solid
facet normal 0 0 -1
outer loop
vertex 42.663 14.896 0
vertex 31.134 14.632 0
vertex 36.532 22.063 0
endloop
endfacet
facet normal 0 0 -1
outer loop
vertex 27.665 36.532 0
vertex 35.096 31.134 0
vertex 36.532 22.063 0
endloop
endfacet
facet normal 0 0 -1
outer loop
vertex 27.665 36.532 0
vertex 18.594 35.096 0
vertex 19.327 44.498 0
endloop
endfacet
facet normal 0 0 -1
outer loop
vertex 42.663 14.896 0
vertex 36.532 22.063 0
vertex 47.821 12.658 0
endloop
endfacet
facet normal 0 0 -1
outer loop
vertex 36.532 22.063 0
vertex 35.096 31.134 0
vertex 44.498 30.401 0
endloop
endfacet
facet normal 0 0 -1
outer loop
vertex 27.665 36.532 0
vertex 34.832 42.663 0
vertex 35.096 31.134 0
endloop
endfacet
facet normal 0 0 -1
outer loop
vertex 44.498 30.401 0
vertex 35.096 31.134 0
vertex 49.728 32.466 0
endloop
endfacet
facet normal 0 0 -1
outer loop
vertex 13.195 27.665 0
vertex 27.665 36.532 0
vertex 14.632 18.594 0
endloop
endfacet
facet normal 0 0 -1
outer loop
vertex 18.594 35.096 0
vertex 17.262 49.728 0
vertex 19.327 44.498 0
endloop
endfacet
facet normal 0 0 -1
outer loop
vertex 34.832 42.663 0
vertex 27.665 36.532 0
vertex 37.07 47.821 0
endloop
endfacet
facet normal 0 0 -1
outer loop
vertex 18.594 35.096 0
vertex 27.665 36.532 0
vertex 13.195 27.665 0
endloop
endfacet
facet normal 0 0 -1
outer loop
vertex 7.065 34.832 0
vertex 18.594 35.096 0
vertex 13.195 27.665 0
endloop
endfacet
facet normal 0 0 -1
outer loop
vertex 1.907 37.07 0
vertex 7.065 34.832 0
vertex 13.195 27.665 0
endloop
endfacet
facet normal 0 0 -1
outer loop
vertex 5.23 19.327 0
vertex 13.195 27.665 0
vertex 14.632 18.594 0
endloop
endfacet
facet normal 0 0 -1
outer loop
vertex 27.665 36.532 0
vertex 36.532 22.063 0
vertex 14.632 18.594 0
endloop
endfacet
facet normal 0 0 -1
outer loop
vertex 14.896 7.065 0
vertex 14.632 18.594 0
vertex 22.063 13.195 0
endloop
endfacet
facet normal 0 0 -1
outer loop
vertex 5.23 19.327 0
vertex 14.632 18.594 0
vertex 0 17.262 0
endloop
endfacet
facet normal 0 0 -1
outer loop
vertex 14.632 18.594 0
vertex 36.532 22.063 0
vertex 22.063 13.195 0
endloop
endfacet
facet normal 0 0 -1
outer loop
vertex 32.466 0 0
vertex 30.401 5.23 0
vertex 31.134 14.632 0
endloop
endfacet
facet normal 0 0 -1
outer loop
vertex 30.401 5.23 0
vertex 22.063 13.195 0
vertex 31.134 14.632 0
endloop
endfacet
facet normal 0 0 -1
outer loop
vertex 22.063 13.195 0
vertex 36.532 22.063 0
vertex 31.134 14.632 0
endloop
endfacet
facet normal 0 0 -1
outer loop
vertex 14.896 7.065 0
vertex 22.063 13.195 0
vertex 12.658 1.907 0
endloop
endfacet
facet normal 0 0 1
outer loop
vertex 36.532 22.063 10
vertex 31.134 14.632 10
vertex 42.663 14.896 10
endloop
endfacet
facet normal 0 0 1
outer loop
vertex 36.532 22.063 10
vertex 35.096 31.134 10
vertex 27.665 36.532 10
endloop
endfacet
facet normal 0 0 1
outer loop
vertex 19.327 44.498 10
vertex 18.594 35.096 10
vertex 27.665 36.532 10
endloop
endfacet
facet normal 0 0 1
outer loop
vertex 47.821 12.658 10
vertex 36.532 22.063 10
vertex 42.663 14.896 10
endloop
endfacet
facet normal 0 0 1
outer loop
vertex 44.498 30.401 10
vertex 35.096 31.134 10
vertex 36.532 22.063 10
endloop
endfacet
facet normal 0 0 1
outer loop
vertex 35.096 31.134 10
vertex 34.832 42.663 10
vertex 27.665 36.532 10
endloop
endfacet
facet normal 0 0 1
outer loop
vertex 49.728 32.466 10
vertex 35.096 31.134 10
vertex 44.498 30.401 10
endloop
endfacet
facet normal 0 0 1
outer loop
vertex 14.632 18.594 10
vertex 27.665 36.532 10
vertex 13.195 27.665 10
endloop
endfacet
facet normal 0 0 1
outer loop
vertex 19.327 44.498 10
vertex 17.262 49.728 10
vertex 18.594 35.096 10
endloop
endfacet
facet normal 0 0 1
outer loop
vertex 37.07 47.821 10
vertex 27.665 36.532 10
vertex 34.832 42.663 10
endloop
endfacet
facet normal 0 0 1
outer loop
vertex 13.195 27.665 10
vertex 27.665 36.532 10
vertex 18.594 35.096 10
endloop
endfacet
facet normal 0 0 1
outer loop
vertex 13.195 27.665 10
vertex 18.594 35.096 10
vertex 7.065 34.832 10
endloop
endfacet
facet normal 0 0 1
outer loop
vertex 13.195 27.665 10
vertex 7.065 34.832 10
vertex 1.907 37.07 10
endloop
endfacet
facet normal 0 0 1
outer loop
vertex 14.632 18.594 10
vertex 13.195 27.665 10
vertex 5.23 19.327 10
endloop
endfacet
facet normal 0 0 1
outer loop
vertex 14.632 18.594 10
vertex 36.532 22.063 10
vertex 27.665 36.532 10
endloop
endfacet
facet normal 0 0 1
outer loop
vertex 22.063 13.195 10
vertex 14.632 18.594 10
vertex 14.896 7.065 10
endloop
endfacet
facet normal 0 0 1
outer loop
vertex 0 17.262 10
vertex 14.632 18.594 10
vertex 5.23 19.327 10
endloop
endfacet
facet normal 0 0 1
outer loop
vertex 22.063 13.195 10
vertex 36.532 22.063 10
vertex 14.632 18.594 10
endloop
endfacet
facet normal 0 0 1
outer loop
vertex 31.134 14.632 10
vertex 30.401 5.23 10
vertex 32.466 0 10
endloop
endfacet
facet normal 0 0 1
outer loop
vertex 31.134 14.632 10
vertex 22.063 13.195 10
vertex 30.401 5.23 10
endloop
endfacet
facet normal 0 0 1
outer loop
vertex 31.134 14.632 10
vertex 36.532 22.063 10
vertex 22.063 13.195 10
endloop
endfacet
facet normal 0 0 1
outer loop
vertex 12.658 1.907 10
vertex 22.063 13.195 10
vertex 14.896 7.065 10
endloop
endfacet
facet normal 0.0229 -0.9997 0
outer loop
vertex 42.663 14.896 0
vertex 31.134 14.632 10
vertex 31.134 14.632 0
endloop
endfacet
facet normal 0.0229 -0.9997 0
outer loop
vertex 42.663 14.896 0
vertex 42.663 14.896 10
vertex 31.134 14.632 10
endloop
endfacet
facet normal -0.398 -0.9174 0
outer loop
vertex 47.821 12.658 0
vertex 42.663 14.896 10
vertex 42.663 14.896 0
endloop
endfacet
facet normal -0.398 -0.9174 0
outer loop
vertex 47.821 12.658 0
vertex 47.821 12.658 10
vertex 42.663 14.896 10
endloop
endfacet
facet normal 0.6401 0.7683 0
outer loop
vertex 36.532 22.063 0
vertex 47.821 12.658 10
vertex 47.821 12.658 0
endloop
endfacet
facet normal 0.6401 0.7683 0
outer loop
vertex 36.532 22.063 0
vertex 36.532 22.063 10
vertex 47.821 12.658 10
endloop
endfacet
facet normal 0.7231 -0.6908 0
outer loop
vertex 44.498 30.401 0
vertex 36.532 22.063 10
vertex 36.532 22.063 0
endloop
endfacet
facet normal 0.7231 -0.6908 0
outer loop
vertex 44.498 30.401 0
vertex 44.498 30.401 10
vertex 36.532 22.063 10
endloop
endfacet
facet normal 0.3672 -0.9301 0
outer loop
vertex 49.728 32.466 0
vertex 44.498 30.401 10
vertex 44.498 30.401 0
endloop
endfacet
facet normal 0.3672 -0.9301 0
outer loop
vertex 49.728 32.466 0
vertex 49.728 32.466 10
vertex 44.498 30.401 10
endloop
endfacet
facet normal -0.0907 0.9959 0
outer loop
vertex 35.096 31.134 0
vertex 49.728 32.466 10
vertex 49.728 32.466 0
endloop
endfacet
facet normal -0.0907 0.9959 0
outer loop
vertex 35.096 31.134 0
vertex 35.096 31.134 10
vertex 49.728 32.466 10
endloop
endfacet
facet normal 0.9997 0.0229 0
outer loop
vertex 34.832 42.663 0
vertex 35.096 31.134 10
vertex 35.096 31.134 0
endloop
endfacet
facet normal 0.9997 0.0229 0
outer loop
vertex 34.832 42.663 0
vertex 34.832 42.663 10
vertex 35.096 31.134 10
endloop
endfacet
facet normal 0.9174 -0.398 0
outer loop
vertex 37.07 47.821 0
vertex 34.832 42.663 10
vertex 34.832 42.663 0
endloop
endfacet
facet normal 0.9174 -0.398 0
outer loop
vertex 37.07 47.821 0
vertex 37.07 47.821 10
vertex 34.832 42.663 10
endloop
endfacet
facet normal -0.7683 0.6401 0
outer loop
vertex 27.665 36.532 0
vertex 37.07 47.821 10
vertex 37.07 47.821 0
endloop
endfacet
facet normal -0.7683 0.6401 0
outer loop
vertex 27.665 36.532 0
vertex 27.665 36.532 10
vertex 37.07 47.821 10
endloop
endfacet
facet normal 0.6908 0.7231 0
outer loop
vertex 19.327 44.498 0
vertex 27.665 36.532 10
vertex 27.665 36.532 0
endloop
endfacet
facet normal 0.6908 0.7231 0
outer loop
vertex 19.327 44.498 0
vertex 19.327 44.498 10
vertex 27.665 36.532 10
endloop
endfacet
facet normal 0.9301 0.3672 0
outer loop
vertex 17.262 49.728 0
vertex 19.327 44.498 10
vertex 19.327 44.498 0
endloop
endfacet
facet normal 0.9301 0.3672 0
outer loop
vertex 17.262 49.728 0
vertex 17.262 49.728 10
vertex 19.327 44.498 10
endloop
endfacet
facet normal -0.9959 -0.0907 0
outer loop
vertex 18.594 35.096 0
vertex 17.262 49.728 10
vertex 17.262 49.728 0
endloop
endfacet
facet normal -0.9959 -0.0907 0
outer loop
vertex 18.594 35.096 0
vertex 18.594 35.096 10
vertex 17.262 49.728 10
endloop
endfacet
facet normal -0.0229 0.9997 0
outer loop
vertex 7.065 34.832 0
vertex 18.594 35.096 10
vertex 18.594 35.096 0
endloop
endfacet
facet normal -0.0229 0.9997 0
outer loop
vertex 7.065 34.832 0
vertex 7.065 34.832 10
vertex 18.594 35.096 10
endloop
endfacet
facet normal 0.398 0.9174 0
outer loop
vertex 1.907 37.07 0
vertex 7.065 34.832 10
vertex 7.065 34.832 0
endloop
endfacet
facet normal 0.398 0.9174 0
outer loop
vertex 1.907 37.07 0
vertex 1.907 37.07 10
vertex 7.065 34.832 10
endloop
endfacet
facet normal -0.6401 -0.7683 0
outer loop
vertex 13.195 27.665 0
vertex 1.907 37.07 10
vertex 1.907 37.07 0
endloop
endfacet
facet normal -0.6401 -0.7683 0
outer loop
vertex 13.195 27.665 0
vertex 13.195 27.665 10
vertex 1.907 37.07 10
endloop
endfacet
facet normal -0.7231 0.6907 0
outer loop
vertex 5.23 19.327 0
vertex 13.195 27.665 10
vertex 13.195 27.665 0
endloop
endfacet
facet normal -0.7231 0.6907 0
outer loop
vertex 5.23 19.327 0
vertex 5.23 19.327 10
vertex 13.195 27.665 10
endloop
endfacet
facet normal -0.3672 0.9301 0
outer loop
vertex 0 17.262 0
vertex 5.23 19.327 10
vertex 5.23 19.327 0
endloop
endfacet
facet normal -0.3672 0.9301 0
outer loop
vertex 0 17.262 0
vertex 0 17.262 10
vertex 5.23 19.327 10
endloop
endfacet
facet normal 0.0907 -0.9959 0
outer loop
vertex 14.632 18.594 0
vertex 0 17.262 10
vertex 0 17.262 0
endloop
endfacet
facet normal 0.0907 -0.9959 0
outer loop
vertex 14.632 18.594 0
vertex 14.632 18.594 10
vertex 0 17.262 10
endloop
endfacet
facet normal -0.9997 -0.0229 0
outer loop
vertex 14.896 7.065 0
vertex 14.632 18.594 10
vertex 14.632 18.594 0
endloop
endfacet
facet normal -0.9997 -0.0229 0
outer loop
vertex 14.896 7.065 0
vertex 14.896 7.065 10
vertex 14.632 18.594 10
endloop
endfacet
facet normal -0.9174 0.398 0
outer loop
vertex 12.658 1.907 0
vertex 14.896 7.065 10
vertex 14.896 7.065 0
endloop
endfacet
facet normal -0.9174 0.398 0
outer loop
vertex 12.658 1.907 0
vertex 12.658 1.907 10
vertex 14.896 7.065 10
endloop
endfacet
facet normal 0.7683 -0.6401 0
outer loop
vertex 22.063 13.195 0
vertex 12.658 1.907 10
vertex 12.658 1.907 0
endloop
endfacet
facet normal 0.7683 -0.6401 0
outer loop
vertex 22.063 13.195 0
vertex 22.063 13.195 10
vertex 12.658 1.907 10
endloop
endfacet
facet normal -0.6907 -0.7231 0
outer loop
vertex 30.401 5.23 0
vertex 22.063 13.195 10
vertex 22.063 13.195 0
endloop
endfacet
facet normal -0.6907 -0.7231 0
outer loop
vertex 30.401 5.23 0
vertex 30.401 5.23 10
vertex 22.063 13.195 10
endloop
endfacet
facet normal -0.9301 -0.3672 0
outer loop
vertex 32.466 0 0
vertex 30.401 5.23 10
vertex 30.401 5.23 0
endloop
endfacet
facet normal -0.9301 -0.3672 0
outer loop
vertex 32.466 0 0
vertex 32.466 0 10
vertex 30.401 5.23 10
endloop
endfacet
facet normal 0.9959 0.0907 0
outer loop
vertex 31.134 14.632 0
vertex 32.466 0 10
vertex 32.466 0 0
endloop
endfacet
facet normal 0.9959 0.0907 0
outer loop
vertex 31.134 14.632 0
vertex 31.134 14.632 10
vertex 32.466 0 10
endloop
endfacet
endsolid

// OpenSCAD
$fn = 32;

// ----------------------------------------------------------------------
// Fan rotor section: 8 blades, 12 mm hub radius, 14 mm blades
// ----------------------------------------------------------------------

// --- parameters (mm) ---
profile_height = 10;      // extrusion height
profile_points = 24;      // points of the closed outline

profile = [[36.532, 22.063], [44.498, 30.401], [49.728, 32.466], [35.096, 31.134], [34.832, 42.663], [37.07, 47.821], [27.665, 36.532], [19.327, 44.498], [17.262, 49.728], [18.594, 35.096], [7.065, 34.832], [1.907, 37.07], [13.195, 27.665], [5.23, 19.327], [0, 17.262], [14.632, 18.594], [14.896, 7.065], [12.658, 1.907], [22.063, 13.195], [30.401, 5.23], [32.466, 0], [31.134, 14.632], [42.663, 14.896], [47.821, 12.658]];  // single closed polygon, 24 points, counter clockwise

// --- the one profile operation ---
linear_extrude(height = profile_height) polygon(points = profile);
